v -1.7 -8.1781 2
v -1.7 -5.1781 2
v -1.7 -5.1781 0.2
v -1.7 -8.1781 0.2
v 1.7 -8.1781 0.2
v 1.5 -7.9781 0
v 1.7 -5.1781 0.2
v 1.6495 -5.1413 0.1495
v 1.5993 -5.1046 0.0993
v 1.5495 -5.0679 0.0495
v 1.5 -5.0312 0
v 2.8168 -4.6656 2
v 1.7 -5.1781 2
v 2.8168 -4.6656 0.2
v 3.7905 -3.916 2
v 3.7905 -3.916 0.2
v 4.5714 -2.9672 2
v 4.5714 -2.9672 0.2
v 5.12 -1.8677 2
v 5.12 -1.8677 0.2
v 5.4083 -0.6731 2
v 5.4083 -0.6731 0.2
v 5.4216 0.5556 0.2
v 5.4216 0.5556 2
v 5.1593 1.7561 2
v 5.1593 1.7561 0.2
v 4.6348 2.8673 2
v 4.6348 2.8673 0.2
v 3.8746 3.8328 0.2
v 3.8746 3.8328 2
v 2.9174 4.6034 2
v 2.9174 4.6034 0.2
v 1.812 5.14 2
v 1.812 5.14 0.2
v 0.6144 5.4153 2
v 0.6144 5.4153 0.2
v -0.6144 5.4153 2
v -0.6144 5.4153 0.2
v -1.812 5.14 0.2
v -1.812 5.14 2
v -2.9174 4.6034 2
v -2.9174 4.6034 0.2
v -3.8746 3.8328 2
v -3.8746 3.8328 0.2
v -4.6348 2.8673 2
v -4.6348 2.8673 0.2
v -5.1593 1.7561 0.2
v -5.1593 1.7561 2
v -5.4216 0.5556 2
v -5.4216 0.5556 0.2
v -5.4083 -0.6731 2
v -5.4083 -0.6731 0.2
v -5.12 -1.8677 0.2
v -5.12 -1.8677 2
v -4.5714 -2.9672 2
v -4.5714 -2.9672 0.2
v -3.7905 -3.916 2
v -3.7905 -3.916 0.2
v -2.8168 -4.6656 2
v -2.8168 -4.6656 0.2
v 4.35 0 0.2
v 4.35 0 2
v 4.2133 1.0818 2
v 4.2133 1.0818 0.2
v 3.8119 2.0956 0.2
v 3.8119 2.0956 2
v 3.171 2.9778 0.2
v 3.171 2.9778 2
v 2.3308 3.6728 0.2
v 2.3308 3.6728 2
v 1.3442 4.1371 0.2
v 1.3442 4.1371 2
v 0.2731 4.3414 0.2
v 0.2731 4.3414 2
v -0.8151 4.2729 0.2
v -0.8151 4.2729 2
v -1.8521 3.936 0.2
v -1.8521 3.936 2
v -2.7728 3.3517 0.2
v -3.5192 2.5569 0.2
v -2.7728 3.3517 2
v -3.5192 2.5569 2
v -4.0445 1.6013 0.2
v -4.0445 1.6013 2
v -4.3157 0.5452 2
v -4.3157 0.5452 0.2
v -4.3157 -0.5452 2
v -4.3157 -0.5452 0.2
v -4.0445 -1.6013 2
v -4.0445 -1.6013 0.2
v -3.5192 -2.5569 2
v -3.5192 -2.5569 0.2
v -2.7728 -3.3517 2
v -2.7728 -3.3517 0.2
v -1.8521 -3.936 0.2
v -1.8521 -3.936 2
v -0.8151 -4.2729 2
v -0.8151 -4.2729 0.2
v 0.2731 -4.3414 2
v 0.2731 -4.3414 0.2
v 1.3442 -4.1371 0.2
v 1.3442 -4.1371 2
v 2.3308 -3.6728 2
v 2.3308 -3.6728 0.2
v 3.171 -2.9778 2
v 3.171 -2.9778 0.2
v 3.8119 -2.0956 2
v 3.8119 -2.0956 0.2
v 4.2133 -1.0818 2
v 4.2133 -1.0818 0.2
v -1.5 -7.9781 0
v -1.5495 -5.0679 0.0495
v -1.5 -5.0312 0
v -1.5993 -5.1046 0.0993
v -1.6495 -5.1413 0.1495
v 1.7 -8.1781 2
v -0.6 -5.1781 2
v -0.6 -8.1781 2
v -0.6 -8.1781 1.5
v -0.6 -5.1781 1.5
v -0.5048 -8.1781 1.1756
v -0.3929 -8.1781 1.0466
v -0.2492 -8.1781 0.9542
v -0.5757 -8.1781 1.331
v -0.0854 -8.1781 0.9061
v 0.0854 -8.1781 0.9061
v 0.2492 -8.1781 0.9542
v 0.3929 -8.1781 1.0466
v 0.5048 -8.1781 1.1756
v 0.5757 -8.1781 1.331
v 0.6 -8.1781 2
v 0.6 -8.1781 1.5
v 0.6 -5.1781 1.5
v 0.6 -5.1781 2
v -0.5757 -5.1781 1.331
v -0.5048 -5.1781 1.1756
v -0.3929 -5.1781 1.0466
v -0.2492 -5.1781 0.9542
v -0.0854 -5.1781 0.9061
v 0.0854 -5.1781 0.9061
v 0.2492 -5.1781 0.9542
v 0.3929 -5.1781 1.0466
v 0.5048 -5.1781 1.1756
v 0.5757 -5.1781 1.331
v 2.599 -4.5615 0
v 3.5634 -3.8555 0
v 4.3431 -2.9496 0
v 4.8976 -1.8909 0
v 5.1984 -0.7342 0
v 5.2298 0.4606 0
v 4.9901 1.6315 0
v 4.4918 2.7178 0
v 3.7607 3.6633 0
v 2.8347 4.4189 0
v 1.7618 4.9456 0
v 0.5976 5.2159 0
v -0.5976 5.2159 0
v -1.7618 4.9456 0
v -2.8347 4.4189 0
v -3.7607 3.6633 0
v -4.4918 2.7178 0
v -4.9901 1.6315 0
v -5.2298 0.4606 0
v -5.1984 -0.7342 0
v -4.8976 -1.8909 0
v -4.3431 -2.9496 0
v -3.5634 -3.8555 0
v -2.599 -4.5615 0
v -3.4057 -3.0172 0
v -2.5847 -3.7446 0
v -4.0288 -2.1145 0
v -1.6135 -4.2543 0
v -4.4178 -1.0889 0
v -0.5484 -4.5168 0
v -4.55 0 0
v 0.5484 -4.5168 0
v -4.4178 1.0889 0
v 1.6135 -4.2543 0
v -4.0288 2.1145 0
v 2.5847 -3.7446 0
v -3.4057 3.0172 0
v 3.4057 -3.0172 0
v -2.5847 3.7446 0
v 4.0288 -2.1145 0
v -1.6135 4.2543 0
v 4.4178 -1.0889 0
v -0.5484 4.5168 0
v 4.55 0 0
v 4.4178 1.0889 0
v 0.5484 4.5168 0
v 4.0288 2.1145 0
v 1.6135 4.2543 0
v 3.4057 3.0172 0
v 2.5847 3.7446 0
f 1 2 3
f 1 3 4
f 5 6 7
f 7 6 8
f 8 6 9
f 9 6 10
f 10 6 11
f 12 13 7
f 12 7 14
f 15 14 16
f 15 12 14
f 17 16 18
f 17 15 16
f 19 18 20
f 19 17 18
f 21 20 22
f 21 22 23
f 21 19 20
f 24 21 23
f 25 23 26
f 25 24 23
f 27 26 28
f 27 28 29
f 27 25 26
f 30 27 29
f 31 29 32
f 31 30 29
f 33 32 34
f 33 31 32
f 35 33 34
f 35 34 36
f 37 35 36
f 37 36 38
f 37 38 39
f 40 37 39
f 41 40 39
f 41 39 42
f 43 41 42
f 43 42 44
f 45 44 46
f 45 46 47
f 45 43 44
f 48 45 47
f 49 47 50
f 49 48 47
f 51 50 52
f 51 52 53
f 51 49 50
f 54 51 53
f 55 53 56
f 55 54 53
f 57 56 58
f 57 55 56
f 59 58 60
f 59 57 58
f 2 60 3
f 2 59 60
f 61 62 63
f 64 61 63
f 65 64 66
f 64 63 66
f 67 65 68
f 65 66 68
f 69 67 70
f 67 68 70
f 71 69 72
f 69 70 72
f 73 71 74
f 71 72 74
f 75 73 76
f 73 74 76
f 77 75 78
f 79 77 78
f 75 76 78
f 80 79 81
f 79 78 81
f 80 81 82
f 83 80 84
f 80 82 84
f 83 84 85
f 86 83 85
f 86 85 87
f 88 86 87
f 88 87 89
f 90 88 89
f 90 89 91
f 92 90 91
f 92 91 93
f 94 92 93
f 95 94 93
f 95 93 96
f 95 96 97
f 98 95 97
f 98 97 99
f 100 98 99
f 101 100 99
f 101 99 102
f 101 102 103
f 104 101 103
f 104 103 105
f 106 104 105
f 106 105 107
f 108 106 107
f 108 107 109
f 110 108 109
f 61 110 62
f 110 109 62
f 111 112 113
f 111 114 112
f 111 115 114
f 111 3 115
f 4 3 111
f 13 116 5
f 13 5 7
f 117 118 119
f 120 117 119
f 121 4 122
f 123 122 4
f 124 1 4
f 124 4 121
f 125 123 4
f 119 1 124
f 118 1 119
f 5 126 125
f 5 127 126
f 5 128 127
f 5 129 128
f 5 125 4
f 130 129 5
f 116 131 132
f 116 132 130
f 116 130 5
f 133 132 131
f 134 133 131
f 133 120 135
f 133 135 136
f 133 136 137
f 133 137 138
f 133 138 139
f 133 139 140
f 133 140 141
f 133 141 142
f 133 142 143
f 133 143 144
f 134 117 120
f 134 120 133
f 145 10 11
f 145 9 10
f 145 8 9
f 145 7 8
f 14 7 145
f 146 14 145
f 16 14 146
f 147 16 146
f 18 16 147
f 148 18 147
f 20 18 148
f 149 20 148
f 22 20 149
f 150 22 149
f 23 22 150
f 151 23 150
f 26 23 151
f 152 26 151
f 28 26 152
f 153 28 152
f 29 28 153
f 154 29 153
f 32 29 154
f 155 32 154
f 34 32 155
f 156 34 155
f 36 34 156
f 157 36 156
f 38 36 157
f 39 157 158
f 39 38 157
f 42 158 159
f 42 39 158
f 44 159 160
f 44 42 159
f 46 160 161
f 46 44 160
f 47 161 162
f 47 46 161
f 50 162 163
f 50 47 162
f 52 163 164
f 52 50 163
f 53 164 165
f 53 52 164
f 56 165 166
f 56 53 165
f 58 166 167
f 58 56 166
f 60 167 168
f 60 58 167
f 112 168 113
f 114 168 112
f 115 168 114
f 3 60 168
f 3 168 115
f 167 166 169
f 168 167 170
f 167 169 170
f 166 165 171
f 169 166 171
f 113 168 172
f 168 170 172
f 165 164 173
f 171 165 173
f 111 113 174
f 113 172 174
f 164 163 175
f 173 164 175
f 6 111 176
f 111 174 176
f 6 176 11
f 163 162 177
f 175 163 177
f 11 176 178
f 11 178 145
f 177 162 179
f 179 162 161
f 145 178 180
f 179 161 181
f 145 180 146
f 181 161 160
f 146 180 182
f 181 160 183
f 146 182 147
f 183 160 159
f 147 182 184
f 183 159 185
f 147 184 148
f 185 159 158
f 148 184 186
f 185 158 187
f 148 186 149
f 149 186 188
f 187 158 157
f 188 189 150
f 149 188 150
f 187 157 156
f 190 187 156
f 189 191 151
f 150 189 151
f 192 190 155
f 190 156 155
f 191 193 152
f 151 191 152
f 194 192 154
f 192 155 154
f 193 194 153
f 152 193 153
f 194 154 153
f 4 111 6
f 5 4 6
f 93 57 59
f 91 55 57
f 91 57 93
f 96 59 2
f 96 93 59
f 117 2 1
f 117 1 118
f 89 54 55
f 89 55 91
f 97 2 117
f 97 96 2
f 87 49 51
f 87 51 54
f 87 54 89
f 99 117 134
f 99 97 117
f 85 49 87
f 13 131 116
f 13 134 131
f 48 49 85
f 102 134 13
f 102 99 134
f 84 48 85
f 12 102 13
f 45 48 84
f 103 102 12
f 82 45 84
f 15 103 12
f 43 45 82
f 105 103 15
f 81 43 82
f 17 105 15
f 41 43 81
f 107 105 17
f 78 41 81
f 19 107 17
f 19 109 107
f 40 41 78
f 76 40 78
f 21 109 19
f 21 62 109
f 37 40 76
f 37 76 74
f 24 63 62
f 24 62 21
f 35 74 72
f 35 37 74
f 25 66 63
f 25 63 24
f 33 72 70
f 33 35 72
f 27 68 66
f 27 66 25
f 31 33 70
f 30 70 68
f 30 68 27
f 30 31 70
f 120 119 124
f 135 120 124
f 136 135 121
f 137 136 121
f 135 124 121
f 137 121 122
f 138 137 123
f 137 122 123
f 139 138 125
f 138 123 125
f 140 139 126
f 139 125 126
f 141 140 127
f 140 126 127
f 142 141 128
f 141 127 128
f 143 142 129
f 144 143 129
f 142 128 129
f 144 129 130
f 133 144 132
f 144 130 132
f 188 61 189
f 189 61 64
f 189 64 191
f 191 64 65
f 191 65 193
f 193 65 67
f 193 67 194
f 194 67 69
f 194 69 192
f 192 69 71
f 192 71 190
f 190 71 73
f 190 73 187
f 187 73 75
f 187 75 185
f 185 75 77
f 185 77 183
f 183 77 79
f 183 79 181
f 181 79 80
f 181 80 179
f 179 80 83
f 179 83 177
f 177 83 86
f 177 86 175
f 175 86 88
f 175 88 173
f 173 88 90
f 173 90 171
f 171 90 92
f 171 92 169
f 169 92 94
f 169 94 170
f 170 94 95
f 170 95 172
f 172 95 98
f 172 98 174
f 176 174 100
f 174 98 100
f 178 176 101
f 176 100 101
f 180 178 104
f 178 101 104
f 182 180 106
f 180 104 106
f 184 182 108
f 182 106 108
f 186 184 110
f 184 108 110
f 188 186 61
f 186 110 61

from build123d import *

# Parameters (mm, degrees)
F0_R     = 4.35
F4_DEPTH = 3
F5_SIZE  = 0.2


with BuildPart() as f2:
    # F2: sweep along a path in F1
    with BuildLine(Plane.XZ) as f2_path:
        Line((0, 0), (0, 2))
    # F0 (on Top) → F2 (sweep)
    with BuildSketch(Plane.XY):
        with BuildLine():
            Line((1.7, -8.178079), (1.7, -5.178079))
            ThreePointArc((1.7, -5.178079), (0, 5.45), (-1.7, -5.178079))
            Line((-1.7, -5.178079), (-1.7, -8.178079))
            Line((-1.7, -8.178079), (1.7, -8.178079))
        make_face()
        Circle(F0_R, mode=Mode.SUBTRACT)
    sweep(path=f2_path.line)

    # F3 (on face) → F4 (cut)
    with BuildSketch(Plane.XZ.offset(8.178079)):
        with BuildLine():
            Line((-0.6, 2), (-0.6, 1.5))
            ThreePointArc((-0.6, 1.5), (0, 0.9), (0.6, 1.5))
            Line((0.6, 1.5), (0.6, 2))
            Line((0.6, 2), (-0.6, 2))
        make_face()
    extrude(amount=-F4_DEPTH, mode=Mode.SUBTRACT)

    # F5
    f5_edges = [f2.edges().sort_by_distance(p)[0] for p in [
        (-1.7, -6.678079, 0),
        (0, 5.45, 0),
        (0, -8.178079, 0),
        (1.7, -6.678079, 0),
        (-4.35, 0, 0),
    ]]
    chamfer(f5_edges, length=F5_SIZE)


solid = f2.part
